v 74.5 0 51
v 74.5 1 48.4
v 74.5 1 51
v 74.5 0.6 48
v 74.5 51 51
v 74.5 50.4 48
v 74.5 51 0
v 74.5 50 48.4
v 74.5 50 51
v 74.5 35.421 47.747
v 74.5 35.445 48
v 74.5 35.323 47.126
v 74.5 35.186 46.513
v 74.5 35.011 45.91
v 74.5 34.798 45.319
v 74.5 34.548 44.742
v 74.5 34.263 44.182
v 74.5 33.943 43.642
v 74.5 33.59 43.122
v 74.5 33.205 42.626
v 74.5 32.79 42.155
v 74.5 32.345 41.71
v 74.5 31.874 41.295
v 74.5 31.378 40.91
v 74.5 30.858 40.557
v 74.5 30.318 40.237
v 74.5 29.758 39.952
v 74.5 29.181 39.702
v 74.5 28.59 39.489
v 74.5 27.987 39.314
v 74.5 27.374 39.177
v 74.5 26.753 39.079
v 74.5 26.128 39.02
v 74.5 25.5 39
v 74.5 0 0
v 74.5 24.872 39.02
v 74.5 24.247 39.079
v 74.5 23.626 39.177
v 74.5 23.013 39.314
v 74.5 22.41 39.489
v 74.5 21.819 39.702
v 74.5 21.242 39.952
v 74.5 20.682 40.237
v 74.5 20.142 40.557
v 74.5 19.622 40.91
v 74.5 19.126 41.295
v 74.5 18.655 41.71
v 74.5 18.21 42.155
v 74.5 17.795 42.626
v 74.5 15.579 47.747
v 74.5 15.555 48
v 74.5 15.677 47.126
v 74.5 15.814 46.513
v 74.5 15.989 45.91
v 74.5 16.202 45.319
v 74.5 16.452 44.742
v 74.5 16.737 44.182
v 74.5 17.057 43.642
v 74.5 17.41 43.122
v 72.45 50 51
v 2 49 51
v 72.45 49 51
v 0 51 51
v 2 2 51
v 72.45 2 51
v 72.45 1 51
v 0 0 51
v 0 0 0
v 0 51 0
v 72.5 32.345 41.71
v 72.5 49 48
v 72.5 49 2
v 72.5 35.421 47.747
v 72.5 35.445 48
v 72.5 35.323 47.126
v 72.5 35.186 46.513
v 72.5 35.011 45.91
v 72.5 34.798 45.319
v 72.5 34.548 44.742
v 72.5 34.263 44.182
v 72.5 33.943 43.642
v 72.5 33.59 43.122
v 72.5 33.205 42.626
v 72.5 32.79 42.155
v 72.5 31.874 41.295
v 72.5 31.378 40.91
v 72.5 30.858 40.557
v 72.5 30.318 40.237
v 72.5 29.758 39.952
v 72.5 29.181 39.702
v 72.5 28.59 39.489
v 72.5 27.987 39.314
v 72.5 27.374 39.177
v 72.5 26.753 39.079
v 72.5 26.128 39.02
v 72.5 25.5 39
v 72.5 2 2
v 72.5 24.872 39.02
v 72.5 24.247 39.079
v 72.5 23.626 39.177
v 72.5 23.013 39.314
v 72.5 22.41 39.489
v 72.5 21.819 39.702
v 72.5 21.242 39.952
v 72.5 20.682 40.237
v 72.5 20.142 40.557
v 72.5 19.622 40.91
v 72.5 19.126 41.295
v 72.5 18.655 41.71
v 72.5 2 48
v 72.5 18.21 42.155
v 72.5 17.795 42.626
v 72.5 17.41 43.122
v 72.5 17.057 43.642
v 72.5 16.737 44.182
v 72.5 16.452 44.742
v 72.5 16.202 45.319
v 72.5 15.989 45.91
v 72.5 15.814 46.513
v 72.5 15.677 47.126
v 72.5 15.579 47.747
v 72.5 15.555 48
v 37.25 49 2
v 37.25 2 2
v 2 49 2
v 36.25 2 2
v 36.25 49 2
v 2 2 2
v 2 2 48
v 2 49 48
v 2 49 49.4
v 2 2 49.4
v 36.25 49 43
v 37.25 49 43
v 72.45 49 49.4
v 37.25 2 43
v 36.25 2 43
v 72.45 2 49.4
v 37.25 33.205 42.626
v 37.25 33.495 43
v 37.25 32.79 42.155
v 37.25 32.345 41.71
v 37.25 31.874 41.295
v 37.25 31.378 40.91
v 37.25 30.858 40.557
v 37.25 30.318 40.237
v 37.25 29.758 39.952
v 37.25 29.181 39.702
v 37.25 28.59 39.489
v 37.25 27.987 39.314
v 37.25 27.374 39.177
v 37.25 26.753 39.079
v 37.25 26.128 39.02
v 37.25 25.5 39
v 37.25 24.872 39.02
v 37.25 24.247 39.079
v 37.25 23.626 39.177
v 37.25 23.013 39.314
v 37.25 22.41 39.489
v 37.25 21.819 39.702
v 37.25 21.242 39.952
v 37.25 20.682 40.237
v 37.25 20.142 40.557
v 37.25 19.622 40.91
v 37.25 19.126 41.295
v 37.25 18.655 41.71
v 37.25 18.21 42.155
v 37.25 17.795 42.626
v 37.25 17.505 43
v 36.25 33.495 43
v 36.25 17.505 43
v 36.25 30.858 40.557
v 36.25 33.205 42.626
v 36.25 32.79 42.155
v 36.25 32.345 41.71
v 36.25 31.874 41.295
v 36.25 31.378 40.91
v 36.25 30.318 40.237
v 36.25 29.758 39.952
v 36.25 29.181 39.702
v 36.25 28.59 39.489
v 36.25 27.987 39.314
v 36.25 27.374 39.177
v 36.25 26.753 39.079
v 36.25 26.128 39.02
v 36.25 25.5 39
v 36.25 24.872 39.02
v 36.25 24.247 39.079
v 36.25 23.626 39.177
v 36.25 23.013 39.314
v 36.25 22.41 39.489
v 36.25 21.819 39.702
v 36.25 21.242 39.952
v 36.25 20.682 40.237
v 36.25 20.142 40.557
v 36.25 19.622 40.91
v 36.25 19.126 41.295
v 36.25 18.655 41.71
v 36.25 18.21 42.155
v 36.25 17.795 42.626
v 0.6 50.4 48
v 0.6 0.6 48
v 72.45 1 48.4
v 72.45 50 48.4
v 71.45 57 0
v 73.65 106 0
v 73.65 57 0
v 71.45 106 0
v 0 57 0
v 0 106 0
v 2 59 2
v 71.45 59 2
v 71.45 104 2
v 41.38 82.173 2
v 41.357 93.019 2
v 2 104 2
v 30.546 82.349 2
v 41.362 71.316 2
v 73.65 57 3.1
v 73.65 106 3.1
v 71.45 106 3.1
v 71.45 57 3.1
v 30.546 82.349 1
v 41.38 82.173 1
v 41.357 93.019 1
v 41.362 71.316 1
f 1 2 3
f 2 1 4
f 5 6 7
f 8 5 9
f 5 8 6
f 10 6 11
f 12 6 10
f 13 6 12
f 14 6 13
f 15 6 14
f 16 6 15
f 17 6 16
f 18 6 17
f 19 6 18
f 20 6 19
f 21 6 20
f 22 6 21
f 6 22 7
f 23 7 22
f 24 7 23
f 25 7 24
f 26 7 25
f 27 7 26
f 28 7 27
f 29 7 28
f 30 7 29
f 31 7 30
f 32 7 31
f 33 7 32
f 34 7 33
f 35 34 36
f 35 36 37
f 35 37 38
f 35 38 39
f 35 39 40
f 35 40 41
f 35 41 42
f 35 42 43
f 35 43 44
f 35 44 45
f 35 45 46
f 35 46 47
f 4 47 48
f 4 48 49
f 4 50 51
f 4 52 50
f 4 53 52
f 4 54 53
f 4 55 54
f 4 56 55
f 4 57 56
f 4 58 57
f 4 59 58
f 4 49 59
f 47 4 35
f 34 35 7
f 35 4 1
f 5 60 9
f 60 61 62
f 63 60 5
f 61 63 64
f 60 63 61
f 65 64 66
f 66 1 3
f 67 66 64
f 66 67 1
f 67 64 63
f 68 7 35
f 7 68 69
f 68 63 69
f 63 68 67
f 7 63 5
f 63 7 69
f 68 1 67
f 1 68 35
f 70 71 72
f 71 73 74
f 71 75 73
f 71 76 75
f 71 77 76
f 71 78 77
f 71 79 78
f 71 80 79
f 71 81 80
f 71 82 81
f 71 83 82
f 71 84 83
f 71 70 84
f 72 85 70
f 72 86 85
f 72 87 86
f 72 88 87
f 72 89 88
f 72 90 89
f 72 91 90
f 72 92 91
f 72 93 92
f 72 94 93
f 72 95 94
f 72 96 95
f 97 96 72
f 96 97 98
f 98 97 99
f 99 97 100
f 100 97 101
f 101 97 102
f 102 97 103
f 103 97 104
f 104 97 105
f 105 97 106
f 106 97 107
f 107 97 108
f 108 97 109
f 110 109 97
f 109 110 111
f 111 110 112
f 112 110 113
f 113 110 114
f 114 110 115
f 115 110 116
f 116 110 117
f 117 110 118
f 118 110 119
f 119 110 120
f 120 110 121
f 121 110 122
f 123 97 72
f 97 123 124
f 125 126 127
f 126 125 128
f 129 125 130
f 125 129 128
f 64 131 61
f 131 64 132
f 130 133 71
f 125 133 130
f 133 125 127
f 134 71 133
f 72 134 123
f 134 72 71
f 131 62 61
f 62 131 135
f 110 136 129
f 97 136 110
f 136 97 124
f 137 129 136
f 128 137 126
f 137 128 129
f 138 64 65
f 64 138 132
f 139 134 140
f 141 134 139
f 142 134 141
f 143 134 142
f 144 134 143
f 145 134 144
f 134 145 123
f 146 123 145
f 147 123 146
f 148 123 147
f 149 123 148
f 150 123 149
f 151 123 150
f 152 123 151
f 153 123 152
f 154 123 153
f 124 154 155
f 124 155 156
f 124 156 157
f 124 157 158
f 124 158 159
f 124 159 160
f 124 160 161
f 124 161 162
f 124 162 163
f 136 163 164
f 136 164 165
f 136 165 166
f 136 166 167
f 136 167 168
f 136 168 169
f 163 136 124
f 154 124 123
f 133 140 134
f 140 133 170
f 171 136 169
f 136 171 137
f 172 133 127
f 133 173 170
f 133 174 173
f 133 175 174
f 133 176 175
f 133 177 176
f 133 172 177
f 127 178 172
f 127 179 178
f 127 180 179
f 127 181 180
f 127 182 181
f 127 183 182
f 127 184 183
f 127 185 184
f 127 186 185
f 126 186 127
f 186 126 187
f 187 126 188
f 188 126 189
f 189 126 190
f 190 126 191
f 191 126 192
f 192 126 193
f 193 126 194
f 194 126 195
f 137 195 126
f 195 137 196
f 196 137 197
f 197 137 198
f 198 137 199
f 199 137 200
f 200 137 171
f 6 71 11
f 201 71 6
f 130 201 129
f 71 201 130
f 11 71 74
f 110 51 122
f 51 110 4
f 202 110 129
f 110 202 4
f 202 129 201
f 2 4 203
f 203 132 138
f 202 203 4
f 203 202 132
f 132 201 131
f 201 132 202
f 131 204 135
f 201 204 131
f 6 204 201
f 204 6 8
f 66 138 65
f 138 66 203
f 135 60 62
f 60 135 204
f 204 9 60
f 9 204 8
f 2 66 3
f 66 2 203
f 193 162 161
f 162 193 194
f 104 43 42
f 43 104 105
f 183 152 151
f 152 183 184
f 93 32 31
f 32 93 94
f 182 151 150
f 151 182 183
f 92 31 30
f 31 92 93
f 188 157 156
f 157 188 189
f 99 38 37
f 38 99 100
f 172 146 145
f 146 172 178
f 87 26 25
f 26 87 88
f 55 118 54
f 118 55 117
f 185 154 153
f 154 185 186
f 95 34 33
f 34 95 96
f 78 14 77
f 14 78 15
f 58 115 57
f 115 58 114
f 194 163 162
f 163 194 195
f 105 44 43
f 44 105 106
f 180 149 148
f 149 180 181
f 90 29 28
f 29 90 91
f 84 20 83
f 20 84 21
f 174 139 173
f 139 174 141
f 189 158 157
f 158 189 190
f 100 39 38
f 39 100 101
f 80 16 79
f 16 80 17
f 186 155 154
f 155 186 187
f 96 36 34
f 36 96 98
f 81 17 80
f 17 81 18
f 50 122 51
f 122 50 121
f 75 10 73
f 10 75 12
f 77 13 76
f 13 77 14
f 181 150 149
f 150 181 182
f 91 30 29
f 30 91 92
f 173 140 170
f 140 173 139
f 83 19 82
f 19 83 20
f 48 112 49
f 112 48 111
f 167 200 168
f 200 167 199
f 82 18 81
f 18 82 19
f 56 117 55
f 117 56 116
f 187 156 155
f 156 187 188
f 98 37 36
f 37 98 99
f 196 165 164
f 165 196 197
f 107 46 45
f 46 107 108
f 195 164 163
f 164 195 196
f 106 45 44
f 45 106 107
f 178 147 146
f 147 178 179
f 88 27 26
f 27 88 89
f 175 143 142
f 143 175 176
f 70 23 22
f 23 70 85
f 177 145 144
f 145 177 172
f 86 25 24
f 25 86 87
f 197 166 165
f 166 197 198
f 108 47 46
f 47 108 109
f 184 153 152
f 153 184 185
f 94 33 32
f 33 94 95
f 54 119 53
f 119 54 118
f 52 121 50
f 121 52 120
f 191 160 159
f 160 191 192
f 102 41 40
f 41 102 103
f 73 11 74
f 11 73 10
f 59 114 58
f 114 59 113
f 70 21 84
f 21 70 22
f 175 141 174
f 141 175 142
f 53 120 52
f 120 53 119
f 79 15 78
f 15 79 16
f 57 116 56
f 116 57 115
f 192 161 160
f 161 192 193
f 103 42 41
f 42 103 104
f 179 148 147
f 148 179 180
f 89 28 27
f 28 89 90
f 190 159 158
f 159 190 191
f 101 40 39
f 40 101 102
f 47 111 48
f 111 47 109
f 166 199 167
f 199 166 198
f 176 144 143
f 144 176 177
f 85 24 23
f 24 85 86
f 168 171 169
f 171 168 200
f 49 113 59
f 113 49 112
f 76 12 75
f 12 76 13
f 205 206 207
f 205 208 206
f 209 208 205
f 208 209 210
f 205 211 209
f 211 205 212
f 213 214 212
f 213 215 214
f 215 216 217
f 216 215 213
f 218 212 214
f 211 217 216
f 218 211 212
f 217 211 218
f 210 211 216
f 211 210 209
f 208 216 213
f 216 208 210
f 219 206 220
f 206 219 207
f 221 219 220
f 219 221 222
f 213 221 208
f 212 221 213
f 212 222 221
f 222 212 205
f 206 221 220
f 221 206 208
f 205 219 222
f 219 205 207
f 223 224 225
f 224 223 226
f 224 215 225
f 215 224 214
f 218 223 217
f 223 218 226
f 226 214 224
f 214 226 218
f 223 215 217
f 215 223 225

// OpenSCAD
// file: carcassonne_box.scad
/**
 * @file carcassonne_box.scad
 * @author Conlan Wesson
 * Template for Carcossonne boxes.
 * @copyright Creative Commons Attribution-NonCommercial-ShareAlike 4.0
 */

mm = 1;
cm = 10*mm;

width = 47*mm;
thick = 2.5*mm;
wall = 2*mm;

/**
 * Lid for box.
 * @param count Number of cards.
 * @param columns Number of columns.
 * @param icon Path to icon DXF file.
 * @param rot Icon rotation in degrees.
 * @param mult Icon scale.
 * @param xoff X-offset of icon from center.
 * @param yoff Y-offset of icon from center.
 */
module carcassonne_lid(count, columns=1, icon=false, rot=0, mult=1, xoff=0, yoff=0, g=0){
	length = (thick * count) + ((width/2) - ((thick * count) % (width/2)));
	w = length+(1.5*wall)+.1;
	l = (width*columns)+wall;
	h = wall;
	d = 2;

	CubePoints = [
		[ 0-g, 0-g,   0 ],  //0
		[ w+g, 0-g,   0 ],  //1
		[ w+g, l+g,   0 ],  //2
		[ 0-g, l+g,   0 ],  //3
		[   d,   d, h+g ],  //4
		[   w,   d, h+g ],  //5
		[   w, l-d, h+g ],  //6
		[   d, l-d, h+g ]   //7
	];
	
	CubeFaces = [
		[0,1,2,3],  // bottom
		[4,5,1,0],  // front
		[7,6,5,4],  // top
		[5,6,2,1],  // right
		[6,7,3,2],  // back
		[7,4,0,3]   // left
	];
	
	
	difference(){
		union(){
			polyhedron( CubePoints, CubeFaces );
			translate([w-wall-.15,0,0]) cube([wall+.2,l, (1.5*wall)+.1]);
		}
		if(icon){
			translate([w/2+xoff,l/3+yoff,h-(wall/2)]){
				linear_extrude(height=(wall)+.1){
					rotate(rot) scale(mult) import(icon);
				}
			}
		}
	}
}

/**
 * Carcassonne card box.
 * @param count Number of cards.
 * @param dividers Array of divider positions.
 * @param columns Number of columns.
 */
module carcassonne_box(count, dividers=[], columns=1){
	length = (thick * count) + ((width/2) - ((thick * count) % (width/2)));
	difference(){
		union(){
			difference(){
				// Outer walls
				cube([length+(2*wall), (width*columns)+(2*wall), width+(2*wall)]);
				// Cavity
				translate([wall, wall, wall]){
					cube([length, width*columns, (width+wall)+.1]);
				}
			}
			// Dividers
			for(col = [0:columns-1]){
				for(div = dividers[col]){
					translate([(div*(width/2))+(wall/2), width*col+wall, 0]) cube([wall/2, width, width-(2*wall)]);
				}
				if(col > 0){
					translate([0, width*col+(wall/2), 0]) cube([length+(2*wall), wall/2, width-(2*wall)]);
				}
			}
		}
		union(){
			// Notch
			for(col = [0:columns-1]){
				translate([wall, wall+(width*col), wall]){
					translate([0, width/2, width])
					rotate([0, 90, 0]){
						cylinder(r=10, h=length+(2*wall), $fn=100);
					}
				}
			}
			// Track
			translate([wall/2,wall/2,width+wall/2]) carcassonne_lid(count, columns, g=0.4);
		}
	}
}
// main file
/**
 * @file halflings.scad
 * @author Conlan Wesson
 * Halflings Carcossonne box.
 * @copyright Creative Commons Attribution-NonCommercial-ShareAlike 4.0
 */

include <carcassonne_box.scad>

count = 24;
dividers = [[1.5]];
columns = 1;

carcassonne_box(count, dividers, columns);
translate([0,width*columns+10,0]) carcassonne_lid(count, columns, icon="halflings.dxf", rot=90, mult=6, xoff=10, yoff=-2);
